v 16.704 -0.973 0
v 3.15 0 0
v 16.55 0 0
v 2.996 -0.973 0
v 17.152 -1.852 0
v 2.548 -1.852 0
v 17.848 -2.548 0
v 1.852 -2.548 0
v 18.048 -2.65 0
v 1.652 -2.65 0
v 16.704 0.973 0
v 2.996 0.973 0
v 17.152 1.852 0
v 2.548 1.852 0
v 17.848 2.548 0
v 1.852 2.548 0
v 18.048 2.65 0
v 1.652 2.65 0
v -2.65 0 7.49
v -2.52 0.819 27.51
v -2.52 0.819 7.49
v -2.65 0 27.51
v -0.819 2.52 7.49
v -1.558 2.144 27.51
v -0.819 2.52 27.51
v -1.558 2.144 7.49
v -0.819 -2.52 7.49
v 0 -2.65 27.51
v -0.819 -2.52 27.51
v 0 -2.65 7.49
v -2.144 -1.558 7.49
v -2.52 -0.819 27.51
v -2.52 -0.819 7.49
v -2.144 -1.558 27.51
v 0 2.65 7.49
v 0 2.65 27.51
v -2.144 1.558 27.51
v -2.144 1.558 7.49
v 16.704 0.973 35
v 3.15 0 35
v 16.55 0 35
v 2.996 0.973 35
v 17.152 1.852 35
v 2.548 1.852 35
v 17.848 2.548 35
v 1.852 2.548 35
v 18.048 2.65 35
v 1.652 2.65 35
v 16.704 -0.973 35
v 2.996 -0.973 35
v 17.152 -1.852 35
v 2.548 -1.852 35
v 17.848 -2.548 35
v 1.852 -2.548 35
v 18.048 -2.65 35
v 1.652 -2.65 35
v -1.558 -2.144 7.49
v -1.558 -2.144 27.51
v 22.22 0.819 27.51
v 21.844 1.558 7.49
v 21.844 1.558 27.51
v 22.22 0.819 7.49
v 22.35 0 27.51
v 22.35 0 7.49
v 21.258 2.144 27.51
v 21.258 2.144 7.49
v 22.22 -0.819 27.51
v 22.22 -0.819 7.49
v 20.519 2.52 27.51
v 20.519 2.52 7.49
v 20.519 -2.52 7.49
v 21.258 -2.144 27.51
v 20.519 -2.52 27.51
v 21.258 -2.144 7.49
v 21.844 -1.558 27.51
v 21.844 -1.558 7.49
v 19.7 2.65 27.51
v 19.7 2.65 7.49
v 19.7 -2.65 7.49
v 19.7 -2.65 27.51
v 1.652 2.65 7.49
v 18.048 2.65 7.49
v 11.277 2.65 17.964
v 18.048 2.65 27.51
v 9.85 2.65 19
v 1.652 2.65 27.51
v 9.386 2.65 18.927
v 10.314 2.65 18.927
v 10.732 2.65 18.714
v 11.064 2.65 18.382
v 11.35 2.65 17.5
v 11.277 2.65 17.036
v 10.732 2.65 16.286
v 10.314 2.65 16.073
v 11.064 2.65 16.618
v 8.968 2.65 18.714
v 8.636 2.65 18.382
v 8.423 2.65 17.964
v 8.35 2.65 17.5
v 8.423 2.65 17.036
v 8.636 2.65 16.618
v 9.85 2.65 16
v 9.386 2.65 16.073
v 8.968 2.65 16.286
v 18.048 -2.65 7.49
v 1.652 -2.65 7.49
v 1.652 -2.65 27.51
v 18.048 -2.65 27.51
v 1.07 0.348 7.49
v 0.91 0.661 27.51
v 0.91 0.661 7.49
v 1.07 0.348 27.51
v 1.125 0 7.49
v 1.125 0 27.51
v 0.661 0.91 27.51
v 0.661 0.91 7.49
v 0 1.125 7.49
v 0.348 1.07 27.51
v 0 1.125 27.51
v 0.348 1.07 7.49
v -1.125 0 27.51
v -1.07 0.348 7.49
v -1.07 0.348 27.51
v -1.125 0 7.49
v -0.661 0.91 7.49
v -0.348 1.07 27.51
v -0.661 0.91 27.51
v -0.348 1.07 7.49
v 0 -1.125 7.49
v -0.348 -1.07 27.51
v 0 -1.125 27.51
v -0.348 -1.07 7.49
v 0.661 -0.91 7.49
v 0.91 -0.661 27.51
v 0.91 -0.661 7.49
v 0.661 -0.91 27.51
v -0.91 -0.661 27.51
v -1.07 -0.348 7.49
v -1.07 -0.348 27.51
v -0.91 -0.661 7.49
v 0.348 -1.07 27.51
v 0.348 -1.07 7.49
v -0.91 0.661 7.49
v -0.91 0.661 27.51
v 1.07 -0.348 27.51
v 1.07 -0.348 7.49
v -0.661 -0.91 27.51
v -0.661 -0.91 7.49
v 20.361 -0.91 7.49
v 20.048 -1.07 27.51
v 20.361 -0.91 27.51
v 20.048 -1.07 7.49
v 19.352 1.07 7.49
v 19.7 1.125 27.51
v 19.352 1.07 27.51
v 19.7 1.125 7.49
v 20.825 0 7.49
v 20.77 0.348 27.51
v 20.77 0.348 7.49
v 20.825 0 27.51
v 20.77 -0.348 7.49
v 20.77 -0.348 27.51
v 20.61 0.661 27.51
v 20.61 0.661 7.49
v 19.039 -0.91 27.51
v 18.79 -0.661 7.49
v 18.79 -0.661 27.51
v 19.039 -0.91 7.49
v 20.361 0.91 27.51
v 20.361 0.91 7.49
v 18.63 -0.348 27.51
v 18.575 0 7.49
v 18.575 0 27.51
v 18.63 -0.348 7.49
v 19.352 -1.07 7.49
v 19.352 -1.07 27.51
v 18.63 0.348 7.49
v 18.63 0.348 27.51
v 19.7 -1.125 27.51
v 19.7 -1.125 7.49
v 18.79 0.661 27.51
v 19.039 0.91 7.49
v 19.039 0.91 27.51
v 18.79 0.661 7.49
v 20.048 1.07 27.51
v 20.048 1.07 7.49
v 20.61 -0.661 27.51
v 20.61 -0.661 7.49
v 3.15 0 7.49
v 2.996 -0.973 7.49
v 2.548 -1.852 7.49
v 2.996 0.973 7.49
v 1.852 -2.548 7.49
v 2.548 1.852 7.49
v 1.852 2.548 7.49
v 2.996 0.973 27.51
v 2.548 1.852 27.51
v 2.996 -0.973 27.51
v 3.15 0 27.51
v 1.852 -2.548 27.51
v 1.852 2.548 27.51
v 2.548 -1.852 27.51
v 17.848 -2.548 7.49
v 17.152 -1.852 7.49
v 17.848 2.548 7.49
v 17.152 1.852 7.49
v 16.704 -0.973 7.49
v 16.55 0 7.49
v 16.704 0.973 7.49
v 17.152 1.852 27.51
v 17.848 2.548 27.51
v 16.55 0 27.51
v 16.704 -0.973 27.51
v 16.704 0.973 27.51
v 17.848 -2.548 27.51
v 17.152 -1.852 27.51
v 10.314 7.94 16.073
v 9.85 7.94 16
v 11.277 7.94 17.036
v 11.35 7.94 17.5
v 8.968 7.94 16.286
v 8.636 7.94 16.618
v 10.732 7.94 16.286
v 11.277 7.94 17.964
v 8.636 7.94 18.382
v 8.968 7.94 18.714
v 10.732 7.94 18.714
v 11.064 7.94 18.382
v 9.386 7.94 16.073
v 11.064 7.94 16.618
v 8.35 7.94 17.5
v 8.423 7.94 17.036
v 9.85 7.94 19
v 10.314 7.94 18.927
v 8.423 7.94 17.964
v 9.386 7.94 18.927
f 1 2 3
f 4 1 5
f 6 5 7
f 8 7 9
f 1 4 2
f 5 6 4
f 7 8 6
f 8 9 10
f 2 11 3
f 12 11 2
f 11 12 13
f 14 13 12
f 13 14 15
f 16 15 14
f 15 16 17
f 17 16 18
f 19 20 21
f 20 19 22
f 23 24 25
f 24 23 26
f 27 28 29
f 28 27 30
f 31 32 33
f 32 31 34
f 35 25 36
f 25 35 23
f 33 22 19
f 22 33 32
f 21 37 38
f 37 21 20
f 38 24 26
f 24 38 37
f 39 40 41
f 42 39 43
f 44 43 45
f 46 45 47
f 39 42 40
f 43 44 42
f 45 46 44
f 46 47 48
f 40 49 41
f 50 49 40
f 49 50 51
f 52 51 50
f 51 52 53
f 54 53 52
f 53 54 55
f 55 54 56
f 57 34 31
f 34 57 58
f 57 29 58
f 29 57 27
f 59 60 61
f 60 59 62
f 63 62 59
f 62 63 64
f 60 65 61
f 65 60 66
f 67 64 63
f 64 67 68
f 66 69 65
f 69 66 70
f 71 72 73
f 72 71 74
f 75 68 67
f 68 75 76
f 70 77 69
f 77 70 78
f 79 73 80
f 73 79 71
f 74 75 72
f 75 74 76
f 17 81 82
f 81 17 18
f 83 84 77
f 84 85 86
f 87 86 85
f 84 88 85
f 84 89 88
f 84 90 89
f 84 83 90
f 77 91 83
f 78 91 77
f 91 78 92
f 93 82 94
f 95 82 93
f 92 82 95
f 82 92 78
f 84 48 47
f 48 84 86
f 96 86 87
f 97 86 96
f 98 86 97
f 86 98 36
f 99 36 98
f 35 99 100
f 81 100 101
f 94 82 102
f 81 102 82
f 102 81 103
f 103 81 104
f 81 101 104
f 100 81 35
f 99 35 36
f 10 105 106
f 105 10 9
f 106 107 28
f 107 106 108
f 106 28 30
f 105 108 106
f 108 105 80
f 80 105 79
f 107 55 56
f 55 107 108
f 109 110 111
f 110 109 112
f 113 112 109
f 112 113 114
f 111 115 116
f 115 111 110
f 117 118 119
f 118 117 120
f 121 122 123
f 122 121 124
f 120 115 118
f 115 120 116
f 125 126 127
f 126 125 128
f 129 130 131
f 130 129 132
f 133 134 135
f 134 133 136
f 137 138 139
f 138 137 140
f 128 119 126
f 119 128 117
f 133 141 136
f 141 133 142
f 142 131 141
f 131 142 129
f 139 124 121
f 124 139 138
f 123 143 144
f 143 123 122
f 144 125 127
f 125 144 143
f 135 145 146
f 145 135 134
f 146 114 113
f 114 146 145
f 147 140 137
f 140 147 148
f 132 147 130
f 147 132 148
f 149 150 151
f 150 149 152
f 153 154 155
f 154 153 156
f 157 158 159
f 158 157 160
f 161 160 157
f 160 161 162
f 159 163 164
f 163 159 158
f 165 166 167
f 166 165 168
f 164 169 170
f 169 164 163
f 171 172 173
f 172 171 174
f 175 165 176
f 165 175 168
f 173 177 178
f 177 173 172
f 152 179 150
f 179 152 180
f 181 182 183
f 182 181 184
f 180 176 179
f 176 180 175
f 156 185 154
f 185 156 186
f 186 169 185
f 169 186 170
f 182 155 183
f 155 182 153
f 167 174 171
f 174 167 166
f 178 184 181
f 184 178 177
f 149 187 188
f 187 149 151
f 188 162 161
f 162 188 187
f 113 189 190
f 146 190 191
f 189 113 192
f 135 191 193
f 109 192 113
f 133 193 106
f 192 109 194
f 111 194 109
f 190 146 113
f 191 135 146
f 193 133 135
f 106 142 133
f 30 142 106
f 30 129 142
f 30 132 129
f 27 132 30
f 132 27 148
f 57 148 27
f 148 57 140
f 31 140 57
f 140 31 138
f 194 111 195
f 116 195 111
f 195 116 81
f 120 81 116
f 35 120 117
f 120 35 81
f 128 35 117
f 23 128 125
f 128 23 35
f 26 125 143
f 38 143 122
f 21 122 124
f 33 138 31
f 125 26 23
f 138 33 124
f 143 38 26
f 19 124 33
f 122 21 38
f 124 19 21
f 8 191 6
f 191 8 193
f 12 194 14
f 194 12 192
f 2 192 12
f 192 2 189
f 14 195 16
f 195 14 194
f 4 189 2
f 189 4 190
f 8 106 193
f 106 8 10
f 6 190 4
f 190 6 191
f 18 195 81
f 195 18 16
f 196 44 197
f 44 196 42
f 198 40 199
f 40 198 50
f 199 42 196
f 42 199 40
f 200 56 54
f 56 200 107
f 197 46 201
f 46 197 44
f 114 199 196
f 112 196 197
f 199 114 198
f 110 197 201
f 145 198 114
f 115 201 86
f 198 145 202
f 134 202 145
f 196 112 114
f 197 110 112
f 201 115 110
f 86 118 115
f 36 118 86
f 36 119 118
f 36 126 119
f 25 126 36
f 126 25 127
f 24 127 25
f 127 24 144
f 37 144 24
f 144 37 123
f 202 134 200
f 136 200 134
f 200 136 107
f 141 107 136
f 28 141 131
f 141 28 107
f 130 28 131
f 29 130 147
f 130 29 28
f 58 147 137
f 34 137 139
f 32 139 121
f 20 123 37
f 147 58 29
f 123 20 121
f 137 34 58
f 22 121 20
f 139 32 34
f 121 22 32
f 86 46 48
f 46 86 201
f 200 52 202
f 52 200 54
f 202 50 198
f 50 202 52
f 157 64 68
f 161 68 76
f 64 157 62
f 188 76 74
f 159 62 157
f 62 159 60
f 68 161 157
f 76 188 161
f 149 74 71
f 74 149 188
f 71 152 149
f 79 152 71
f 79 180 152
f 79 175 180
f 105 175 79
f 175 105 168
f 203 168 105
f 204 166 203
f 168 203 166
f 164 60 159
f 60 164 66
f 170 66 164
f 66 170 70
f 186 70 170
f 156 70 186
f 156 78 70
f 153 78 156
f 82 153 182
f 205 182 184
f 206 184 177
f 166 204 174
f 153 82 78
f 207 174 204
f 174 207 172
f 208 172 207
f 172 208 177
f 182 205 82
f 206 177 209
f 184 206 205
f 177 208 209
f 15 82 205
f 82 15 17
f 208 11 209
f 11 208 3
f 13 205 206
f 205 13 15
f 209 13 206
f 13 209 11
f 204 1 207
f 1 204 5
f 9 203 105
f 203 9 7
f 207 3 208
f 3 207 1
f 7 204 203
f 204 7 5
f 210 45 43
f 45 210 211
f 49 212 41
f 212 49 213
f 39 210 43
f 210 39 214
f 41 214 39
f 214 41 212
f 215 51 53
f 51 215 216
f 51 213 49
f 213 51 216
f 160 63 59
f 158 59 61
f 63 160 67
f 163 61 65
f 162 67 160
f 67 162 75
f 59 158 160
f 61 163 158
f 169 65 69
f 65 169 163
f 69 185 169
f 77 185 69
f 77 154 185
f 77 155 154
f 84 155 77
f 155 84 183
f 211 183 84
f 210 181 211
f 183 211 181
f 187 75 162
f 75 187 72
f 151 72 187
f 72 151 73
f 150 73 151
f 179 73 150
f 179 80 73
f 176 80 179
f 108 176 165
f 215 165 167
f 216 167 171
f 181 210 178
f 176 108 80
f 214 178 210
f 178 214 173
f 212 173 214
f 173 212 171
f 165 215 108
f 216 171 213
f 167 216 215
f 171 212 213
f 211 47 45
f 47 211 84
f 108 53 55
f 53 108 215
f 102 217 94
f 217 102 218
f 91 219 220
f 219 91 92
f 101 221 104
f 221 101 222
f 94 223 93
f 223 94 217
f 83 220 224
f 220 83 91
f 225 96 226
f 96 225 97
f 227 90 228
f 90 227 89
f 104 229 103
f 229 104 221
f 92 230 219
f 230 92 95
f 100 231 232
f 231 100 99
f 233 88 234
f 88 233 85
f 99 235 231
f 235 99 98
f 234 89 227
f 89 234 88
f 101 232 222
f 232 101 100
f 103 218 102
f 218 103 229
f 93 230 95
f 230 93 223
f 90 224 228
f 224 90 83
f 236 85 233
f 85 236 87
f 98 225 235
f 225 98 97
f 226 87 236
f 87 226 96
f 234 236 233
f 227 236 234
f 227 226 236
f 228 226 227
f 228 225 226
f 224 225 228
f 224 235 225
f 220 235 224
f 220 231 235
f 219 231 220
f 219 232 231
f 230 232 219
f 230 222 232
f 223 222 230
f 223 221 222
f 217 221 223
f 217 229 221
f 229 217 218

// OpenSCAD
// file: cross.scad
include <belt_configuration.scad>

module cross()
{
  difference()
  {
    union()
    {
      cylinder(r=belt_thickness / 2, h=belt_height);

      translate([cross_width - belt_thickness,0,0])
        cylinder(r=belt_thickness / 2, h=belt_height);

      translate([0, -belt_thickness / 2, 0])
        cube([cross_width-belt_thickness, belt_thickness, belt_height]);
    }

    translate([0,0,-mo])
      cylinder(r=(pin_diameter +pin_tolerance)/ 2 , h=belt_height + 2 * mo);


    translate([cross_width - belt_thickness,0,-mo])
      cylinder(r=(pin_diameter +pin_tolerance) / 2, h=belt_height + 2 * mo);

    translate([-belt_thickness / 2, -belt_thickness / 2 - mo, -mo])
      cube([link_depth-pin_diameter/4, belt_thickness + 2* mo, (belt_height - link_depth_height) / 2]);
    translate([0,0,-mo])
      cylinder(r=(belt_thickness+link_tolerance) / 2, h=(belt_height - link_depth_height) / 2);

    translate([-belt_thickness / 2, -belt_thickness / 2 - mo, belt_height - (belt_height - link_depth_height) / 2+mo])
      cube([link_depth-pin_diameter/4, belt_thickness + 2* mo, belt_height - link_depth_height * 2]);
    translate([0,0,belt_height - (belt_height - link_depth_height) / 2+mo])
      cylinder(r=(belt_thickness+link_tolerance) / 2, h=(belt_height - link_depth_height) / 2);

    translate([cross_width - link_depth+pin_diameter/4 - belt_thickness / 2, -belt_thickness / 2 - mo, -mo])
      cube([link_depth-pin_diameter/4, belt_thickness + 2* mo, (belt_height - link_depth_height) / 2]);
    translate([cross_width - belt_thickness,0,-mo])
      cylinder(r=(belt_thickness+link_tolerance) / 2, h=(belt_height - link_depth_height) / 2);

    translate([cross_width - link_depth+pin_diameter/4 - belt_thickness / 2, -belt_thickness / 2 - mo, belt_height - (belt_height - link_depth_height) / 2+mo])
      cube([link_depth-pin_diameter/4, belt_thickness + 2* mo, belt_height - link_depth_height * 2]);
    translate([cross_width - belt_thickness,0,belt_height - (belt_height - link_depth_height) / 2+mo])
      cylinder(r=(belt_thickness+link_tolerance) / 2, h=(belt_height - link_depth_height) / 2);
  }
}

cross();
// file: belt_configuration.scad
belt_thickness = 5.3;
belt_height = 35;
buckle_thickness = 2;
buckle_length = 30;

$fn = 20;

cross_width = 25;
h_width = 25;
peak_width = 10;

link_height = 20;

pin_diameter = 2.05;

pin_tolerance = 0.2;

hole_diameter = 3;

mo = 0.01;


link_tolerance = 1;
link_depth = pin_diameter + 2*link_tolerance;
link_depth_height = 20;

tolerance = 1;
// main file
include <belt_configuration.scad>

use <cross.scad>

module cross_male()
{
	union()
   {
		cross();
      translate([cross_width/2-belt_thickness / 2,belt_thickness/2-mo,belt_height/2])
		rotate([-90,0,0])
        cylinder(r=hole_diameter / 2, h=belt_thickness);
   }
}

cross_male();
